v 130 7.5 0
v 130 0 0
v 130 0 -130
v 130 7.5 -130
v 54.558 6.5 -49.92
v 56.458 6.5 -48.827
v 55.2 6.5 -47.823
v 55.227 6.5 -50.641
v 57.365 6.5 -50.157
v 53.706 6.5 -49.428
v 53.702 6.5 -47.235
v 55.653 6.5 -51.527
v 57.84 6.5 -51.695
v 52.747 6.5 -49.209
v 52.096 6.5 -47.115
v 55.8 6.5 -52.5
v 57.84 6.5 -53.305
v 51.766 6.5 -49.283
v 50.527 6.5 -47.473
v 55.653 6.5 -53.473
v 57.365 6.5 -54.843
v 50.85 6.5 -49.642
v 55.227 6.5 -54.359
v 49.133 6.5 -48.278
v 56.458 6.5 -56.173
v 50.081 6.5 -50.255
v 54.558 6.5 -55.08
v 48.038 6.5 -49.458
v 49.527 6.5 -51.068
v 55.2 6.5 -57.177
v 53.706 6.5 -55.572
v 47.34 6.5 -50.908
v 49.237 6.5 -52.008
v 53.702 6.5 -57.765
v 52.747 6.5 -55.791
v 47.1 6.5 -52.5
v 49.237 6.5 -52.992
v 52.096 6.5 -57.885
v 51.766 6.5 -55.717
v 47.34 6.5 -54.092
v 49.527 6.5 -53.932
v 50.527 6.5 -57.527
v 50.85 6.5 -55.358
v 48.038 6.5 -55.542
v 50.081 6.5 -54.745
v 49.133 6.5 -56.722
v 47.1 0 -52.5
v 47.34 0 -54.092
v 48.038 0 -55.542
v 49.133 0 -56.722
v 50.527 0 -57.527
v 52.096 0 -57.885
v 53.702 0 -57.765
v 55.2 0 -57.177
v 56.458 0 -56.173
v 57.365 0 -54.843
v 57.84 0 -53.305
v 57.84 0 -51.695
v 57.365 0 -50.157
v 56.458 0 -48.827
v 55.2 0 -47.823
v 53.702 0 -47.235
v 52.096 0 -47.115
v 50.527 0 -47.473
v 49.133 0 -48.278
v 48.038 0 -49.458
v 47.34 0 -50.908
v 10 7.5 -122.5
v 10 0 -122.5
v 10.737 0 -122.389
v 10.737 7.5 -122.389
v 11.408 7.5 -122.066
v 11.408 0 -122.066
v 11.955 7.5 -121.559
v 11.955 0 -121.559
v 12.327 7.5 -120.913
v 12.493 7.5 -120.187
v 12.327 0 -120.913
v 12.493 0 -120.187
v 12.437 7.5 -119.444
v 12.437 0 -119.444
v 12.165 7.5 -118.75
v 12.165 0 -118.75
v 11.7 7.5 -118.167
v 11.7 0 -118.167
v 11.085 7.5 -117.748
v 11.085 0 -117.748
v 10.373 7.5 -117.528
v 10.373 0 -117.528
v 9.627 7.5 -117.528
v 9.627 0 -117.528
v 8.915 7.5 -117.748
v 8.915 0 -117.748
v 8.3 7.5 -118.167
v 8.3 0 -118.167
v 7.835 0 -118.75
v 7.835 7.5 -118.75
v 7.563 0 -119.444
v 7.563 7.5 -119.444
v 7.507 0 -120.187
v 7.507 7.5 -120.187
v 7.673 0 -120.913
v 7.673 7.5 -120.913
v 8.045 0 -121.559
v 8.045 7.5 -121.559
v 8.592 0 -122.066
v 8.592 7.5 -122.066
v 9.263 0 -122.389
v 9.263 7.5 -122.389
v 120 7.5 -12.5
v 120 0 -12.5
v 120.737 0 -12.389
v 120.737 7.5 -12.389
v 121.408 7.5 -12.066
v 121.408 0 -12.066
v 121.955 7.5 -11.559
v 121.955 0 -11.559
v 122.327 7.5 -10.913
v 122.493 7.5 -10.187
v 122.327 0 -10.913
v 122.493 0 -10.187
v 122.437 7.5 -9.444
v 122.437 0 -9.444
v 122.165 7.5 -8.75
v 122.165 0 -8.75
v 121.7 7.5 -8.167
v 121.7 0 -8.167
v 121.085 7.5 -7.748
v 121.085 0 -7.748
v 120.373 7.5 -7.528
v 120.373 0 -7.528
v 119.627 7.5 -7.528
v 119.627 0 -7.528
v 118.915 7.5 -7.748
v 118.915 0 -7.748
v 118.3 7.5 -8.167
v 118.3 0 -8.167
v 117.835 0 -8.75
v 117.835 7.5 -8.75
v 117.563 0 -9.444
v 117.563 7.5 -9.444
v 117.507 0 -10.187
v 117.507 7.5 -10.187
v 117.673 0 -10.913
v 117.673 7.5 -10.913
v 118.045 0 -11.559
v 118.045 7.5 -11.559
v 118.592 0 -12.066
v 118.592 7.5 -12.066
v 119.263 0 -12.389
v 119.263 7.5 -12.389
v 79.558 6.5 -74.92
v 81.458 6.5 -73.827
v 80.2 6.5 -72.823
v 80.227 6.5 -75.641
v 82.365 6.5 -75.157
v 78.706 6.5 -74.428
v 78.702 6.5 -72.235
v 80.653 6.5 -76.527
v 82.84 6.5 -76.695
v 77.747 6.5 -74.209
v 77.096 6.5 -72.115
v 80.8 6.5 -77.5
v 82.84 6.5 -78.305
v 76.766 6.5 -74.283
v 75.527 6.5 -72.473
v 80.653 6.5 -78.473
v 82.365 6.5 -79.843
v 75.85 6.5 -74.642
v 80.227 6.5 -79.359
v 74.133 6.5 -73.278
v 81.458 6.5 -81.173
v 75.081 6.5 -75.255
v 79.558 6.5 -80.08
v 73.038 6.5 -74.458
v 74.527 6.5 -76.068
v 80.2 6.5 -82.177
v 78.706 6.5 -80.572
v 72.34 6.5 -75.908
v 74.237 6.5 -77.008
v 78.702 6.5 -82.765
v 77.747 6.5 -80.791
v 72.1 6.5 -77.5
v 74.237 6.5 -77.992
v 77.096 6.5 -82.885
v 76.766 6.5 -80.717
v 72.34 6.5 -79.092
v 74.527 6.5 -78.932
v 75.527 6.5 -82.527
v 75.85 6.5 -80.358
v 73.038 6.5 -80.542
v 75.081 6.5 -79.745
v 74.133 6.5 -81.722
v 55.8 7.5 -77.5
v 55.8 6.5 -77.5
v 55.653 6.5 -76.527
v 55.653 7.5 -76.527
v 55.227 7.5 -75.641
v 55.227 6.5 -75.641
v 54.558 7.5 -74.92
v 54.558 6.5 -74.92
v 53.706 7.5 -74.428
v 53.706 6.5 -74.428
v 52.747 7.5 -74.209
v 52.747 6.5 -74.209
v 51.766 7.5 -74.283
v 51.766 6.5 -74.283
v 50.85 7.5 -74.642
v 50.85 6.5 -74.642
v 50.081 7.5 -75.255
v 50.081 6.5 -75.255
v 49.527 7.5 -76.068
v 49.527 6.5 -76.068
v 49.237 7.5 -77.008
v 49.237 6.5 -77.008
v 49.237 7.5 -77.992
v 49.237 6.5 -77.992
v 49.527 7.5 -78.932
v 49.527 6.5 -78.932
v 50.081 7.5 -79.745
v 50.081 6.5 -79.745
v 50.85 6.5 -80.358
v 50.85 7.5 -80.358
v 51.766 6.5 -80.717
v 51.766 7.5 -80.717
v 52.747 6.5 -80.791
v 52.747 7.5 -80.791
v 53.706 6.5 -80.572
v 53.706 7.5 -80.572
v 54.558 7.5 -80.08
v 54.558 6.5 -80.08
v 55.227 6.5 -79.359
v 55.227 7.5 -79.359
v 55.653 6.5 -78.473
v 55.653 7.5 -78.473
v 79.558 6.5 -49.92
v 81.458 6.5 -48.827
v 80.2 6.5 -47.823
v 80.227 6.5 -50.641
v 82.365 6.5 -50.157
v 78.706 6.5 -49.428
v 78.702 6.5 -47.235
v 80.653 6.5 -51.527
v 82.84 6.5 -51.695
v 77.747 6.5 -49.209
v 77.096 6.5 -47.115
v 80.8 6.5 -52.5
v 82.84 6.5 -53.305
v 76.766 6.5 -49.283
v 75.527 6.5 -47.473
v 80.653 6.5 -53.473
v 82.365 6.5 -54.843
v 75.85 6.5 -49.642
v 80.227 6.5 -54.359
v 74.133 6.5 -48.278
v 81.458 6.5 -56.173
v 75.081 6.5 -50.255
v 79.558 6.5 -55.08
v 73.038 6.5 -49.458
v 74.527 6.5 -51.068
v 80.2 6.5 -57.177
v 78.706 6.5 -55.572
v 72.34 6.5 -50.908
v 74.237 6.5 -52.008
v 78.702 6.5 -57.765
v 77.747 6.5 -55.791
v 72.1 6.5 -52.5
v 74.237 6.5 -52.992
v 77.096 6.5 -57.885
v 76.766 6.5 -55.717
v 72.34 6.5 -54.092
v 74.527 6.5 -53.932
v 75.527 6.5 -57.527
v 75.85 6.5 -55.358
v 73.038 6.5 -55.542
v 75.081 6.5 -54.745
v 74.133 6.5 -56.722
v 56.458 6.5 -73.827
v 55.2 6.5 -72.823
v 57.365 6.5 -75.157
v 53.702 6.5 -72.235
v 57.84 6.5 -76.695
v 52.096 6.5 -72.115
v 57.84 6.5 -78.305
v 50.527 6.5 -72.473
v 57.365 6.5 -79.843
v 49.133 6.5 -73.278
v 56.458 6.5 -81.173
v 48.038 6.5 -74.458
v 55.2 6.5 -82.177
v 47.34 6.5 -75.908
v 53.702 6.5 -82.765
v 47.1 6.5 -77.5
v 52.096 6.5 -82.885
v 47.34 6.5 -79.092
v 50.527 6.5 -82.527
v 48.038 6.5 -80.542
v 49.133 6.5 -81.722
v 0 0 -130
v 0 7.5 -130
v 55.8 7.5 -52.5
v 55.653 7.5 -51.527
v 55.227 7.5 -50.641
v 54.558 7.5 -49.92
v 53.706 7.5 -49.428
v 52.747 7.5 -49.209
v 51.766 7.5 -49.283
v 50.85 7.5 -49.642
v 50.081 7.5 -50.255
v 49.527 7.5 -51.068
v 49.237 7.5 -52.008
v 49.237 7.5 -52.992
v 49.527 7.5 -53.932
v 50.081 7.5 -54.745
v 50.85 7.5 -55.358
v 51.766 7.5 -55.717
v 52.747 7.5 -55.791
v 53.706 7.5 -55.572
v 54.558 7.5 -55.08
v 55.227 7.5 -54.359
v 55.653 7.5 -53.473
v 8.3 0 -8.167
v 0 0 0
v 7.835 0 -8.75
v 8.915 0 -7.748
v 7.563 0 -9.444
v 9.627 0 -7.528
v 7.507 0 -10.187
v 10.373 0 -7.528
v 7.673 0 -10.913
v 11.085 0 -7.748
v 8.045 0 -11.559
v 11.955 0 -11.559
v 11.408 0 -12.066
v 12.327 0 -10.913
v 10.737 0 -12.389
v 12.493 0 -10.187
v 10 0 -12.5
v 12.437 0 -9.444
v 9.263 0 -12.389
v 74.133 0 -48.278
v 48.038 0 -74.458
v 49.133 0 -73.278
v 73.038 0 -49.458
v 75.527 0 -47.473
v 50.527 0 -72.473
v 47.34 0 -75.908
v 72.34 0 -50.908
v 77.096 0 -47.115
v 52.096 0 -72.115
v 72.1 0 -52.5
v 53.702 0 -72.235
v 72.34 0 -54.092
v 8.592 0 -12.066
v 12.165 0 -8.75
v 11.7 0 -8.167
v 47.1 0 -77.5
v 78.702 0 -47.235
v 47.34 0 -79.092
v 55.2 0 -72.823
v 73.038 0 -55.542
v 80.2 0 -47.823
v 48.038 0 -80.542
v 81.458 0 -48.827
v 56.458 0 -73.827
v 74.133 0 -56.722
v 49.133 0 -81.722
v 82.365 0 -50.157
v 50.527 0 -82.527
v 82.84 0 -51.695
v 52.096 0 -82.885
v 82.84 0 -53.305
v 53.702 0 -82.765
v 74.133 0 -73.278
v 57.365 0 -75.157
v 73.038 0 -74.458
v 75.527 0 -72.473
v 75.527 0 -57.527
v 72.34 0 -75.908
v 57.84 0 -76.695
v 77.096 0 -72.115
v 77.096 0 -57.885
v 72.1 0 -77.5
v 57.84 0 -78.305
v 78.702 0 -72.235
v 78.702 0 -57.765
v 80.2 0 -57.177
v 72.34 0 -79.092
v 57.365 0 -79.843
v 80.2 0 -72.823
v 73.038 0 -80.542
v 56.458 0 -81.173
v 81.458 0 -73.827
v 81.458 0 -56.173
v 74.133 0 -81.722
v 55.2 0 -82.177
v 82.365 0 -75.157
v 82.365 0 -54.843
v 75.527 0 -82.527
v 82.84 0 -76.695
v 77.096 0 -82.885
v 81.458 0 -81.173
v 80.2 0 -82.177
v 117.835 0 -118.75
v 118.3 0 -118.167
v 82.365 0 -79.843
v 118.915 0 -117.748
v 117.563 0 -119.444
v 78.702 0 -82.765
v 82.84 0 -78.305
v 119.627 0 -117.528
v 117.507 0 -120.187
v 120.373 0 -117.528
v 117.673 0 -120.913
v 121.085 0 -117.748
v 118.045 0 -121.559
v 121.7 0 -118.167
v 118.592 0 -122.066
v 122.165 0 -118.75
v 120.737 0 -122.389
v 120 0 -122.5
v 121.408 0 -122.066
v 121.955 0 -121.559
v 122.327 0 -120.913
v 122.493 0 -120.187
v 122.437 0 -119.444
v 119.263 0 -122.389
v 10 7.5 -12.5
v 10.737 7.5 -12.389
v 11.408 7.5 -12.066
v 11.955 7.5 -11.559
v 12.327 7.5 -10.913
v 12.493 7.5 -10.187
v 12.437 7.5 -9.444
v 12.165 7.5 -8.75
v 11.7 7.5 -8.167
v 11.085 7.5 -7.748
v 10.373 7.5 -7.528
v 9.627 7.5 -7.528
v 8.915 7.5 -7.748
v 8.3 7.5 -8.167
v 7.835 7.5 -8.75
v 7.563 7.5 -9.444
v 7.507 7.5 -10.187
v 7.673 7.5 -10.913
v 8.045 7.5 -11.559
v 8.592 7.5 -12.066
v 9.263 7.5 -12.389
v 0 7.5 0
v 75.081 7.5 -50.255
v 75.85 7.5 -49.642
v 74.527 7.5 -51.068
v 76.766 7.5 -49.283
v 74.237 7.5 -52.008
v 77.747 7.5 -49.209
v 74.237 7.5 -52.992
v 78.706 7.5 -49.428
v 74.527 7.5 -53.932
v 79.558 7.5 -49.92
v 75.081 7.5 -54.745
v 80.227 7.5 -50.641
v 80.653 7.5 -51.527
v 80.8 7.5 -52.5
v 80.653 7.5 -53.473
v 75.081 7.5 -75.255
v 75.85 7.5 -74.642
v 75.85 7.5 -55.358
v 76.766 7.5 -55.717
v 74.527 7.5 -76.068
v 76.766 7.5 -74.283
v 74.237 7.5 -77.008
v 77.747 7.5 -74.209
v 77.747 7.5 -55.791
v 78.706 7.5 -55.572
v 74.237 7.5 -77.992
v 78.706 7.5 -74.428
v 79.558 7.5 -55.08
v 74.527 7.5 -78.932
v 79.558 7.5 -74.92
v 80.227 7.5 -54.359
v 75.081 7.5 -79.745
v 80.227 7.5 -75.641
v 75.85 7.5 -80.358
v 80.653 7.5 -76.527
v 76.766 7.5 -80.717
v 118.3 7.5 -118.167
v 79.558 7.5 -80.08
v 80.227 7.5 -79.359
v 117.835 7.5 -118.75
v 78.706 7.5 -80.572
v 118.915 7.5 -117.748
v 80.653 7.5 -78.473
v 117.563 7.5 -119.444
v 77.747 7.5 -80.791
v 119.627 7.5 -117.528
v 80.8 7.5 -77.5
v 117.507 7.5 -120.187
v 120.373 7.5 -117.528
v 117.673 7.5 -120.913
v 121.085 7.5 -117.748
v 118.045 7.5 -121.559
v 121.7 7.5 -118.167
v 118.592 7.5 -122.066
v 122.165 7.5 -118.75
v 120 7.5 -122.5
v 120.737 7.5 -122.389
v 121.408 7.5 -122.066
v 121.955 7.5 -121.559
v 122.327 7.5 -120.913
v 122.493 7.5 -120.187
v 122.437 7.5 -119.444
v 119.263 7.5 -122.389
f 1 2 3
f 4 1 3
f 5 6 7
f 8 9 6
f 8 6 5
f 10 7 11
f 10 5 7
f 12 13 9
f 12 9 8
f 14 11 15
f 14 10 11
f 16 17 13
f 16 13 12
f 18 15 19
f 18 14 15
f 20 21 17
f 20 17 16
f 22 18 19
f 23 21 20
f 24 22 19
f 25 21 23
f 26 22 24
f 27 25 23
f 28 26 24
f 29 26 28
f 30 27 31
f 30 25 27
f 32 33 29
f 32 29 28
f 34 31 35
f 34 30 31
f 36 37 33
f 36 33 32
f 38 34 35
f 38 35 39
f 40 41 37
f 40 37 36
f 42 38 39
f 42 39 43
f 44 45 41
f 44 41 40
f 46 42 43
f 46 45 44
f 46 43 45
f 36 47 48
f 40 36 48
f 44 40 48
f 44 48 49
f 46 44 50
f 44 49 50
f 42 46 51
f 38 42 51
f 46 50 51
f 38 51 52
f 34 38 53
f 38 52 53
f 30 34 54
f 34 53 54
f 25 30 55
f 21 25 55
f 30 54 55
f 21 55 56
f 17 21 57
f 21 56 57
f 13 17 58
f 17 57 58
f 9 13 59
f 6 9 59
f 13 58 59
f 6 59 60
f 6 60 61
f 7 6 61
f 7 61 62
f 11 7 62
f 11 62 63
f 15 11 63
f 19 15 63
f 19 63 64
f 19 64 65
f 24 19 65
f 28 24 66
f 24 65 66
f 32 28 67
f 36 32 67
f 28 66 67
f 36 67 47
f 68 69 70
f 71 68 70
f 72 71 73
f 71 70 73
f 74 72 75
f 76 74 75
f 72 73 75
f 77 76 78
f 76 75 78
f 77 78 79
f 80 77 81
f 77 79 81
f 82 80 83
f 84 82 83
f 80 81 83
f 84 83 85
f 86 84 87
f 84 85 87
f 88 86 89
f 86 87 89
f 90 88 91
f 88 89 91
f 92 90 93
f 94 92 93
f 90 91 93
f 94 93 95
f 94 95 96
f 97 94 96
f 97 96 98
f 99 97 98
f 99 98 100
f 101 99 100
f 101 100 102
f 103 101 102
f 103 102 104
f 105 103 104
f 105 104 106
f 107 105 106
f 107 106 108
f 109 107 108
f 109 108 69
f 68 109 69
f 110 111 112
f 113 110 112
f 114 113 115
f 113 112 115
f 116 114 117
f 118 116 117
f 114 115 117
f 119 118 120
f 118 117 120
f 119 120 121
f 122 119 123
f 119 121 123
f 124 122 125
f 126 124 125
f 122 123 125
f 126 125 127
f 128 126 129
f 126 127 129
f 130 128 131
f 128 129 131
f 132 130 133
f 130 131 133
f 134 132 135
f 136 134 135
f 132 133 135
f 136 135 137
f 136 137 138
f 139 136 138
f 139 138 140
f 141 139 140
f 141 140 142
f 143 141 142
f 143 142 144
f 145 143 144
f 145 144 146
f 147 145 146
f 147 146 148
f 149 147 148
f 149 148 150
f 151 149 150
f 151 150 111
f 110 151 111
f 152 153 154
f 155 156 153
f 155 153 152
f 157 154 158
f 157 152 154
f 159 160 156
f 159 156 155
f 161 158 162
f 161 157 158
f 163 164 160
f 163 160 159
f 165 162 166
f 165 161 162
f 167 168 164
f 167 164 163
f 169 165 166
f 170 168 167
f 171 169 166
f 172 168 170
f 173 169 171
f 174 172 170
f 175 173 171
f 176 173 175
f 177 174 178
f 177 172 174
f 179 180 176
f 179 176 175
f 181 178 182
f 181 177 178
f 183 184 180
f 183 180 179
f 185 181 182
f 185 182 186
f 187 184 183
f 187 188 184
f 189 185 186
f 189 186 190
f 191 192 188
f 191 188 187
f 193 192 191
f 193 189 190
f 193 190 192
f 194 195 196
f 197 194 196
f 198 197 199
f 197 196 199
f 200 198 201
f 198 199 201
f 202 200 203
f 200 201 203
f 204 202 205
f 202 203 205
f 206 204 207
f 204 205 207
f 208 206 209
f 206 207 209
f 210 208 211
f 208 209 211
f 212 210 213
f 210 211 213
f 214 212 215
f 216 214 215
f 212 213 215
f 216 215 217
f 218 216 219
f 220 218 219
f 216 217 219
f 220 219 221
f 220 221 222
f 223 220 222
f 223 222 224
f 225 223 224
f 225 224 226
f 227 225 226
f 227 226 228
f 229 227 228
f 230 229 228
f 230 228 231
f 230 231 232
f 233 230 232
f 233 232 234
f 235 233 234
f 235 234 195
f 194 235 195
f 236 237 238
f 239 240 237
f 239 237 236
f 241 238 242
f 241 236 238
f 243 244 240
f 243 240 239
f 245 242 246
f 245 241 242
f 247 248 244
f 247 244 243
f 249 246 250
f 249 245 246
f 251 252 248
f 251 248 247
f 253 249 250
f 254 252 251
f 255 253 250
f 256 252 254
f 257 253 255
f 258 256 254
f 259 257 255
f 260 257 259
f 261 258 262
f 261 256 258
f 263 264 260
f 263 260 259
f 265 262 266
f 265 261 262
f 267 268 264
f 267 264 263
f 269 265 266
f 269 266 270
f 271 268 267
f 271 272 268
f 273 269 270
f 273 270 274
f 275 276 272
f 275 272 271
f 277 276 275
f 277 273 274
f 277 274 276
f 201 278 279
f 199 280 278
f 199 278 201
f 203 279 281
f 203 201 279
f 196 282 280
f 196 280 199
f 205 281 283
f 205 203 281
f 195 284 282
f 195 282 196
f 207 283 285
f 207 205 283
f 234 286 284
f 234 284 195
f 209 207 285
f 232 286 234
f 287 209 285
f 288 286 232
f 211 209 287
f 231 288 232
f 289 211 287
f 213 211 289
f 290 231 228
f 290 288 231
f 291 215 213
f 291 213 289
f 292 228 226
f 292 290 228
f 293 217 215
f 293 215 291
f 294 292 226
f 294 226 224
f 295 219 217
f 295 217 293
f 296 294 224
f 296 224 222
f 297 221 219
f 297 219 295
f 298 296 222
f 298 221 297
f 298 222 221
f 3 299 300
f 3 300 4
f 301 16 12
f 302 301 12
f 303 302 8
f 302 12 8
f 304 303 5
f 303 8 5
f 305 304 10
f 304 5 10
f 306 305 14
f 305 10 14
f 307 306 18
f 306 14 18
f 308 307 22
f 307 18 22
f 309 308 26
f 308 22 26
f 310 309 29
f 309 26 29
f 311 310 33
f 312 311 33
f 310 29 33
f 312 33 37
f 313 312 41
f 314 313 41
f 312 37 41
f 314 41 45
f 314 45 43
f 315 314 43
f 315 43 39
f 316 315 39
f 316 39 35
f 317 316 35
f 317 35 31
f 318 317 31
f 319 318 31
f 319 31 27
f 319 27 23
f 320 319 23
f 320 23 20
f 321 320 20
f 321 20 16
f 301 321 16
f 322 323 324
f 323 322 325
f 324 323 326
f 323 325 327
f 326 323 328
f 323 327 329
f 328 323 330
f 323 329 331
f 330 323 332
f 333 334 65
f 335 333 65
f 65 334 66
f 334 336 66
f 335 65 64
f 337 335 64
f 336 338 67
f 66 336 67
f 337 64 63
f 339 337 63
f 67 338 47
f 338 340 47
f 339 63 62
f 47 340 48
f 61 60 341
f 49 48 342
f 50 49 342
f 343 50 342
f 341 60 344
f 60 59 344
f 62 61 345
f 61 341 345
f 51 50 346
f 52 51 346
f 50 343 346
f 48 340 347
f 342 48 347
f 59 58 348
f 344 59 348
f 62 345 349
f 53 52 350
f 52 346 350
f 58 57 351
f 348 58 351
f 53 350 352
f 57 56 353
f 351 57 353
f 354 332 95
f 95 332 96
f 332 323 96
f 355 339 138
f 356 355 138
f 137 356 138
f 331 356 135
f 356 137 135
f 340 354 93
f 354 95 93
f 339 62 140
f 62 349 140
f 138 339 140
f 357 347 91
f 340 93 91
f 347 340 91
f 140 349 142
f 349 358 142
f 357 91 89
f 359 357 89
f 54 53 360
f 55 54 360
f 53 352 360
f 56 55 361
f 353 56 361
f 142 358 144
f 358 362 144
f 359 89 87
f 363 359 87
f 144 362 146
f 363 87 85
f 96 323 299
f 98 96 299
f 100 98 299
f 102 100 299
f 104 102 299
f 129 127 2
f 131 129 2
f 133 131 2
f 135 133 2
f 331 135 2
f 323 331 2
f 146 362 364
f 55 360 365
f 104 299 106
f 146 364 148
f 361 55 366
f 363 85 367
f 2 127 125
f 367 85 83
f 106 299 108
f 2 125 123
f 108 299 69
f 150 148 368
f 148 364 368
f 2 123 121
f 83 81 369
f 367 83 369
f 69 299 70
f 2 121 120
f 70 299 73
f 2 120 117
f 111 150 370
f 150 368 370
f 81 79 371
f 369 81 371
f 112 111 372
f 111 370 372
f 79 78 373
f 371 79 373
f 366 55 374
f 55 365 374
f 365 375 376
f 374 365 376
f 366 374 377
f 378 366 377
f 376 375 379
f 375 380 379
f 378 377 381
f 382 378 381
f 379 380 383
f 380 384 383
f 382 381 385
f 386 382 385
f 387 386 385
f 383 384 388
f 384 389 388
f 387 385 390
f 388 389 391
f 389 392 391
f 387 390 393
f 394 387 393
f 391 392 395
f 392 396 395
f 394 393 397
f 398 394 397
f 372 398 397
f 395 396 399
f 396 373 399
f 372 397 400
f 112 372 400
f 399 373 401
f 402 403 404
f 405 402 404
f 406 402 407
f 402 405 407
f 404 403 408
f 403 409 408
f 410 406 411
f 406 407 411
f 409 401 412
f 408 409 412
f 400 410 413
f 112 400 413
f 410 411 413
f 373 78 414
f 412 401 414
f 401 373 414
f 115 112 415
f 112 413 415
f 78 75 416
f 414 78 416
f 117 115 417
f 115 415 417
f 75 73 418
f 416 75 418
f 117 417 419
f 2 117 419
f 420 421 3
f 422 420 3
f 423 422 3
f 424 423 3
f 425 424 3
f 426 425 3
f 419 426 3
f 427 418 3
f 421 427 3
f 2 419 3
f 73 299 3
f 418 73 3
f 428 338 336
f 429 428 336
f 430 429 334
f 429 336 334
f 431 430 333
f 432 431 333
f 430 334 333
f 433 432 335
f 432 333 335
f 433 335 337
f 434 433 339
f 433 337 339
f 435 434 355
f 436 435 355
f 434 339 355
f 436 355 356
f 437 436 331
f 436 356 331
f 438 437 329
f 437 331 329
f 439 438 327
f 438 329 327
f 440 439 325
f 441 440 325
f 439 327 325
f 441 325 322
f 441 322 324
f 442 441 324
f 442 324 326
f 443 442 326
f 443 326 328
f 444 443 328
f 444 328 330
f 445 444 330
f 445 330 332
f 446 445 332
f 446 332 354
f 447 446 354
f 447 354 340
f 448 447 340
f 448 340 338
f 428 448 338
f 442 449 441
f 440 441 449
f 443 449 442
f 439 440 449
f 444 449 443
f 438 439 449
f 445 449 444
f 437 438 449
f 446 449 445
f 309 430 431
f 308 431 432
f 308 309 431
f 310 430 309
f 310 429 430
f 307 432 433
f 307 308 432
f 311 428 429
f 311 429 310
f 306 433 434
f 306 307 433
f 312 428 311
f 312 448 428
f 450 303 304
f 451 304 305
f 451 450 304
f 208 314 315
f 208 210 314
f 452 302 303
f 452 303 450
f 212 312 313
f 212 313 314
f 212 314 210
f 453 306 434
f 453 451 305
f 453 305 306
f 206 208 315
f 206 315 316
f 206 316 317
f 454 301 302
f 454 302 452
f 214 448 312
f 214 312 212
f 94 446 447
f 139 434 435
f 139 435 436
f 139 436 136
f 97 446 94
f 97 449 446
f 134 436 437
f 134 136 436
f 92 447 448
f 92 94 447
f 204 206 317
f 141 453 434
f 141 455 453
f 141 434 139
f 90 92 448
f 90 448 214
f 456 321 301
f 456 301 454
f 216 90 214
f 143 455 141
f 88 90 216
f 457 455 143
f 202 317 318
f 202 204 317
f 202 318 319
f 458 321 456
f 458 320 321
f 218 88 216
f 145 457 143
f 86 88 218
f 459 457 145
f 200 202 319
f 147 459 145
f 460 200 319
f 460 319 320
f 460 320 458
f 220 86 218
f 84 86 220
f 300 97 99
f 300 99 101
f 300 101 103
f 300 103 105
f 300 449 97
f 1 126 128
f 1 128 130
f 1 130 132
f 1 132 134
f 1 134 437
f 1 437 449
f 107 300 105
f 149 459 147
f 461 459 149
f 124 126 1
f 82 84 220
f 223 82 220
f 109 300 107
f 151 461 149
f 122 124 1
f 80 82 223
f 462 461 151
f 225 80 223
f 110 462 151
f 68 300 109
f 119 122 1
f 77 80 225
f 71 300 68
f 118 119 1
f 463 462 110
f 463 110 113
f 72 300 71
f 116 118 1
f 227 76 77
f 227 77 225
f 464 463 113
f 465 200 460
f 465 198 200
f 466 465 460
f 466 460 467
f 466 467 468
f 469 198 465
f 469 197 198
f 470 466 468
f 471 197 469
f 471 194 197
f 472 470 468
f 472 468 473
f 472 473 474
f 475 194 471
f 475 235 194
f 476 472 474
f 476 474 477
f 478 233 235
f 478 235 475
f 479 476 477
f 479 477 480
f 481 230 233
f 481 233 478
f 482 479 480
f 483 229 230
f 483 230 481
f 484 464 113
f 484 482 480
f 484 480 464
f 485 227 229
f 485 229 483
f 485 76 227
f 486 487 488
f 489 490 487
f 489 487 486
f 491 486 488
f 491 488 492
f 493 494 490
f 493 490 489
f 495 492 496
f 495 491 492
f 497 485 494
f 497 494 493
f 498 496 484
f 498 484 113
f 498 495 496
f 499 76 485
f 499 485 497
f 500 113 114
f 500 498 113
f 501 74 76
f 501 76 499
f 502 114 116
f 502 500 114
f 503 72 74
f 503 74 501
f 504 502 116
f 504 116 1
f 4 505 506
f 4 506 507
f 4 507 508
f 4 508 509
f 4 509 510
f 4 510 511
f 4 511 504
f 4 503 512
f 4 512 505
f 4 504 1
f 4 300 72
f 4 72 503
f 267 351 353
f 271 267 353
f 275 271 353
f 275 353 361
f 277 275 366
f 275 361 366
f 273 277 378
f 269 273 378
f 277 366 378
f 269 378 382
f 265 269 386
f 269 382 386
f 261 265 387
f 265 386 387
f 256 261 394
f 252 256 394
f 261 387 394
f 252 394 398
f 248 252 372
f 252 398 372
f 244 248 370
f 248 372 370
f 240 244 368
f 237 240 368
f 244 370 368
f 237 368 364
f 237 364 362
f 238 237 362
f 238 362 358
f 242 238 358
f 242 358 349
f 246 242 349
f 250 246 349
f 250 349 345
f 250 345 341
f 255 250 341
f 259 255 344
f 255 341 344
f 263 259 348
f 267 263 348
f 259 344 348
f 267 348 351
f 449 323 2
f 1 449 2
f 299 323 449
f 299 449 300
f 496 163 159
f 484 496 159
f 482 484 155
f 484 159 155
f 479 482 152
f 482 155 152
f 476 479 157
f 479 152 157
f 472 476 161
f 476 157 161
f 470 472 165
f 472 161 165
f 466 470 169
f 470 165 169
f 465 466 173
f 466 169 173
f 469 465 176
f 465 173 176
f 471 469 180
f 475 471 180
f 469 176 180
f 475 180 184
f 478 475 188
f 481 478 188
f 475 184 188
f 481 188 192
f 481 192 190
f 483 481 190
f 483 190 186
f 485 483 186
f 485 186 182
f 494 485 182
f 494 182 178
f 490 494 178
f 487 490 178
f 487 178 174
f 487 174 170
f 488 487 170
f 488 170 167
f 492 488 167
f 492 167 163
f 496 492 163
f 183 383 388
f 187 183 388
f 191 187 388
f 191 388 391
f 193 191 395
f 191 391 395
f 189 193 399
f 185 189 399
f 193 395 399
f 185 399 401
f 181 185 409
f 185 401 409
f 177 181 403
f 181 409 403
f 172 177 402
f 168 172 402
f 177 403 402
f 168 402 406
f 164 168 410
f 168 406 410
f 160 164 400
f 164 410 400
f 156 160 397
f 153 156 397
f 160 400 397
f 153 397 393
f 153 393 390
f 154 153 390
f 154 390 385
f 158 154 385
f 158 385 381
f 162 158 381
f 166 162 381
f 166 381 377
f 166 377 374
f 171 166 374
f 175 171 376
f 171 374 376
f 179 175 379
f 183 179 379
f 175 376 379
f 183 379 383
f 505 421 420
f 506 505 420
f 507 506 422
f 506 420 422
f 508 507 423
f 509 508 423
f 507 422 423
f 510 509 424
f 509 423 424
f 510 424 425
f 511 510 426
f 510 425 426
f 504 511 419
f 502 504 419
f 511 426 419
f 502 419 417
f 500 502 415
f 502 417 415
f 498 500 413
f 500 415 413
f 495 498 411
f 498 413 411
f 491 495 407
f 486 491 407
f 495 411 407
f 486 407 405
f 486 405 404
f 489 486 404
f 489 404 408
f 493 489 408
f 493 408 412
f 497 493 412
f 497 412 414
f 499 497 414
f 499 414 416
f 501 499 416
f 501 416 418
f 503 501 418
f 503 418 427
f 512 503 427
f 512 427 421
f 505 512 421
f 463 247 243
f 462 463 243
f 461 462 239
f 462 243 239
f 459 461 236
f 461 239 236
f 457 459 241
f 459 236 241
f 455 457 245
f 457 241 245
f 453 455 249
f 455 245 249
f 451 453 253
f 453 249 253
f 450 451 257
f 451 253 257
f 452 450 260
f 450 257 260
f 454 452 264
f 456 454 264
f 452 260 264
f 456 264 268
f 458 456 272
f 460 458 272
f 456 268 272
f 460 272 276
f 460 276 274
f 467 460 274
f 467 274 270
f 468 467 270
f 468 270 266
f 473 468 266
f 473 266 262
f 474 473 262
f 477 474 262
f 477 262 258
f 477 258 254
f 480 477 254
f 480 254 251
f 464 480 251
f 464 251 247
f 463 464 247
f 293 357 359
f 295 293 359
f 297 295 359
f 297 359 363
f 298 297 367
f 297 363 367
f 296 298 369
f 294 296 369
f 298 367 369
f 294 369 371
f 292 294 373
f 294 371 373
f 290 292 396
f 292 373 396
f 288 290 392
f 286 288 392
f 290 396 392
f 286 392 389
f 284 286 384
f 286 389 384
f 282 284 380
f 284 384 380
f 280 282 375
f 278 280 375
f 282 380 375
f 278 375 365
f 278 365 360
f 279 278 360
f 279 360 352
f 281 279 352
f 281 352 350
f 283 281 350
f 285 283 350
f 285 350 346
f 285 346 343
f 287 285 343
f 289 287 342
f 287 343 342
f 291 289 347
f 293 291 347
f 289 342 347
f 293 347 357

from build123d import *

# Parameters (mm, degrees)
SKETCH_1_W          = 130
SKETCH_1_H          = 130
EXTRUDE_1_DEPTH     = 7.5
HOLE_WIZARD_M6_2_D  = 5
SKETCH_6_R          = 5.4
CUT_EXTRUDE_1_DEPTH = 6.5
SKETCH_7_R          = 3.3
CUT_EXTRUDE_2_DEPTH = 2


with BuildPart() as part:
    # 草图1 → 凸台-拉伸1 (new body)
    with BuildSketch(Plane(origin=(0, 0, 0), x_dir=(1, 0, 0), z_dir=(0, 1, 0))):
        with Locations((65, 65)):
            Rectangle(SKETCH_1_W, SKETCH_1_H)
    extrude(amount=EXTRUDE_1_DEPTH)

    # M6 螺纹孔2 (through all)
    with Locations(Plane(origin=(10, 7.5, -120), x_dir=(0, 0, 1), z_dir=(0, 1, 0))):
        with Locations((0, 0), (0, 110), (110, 110), (110, 0)):
            Hole(HOLE_WIZARD_M6_2_D / 2)

    # 草图6 → 切除-拉伸1 (cut)
    with BuildSketch(Plane(origin=(0, 0, 0), x_dir=(-1, 0, 0), z_dir=(0, -1, 0))):
        with Locations((-52.5, 52.5)):
            Circle(SKETCH_6_R)
        with Locations((-77.5, 52.5)):
            Circle(SKETCH_6_R)
        with Locations((-52.5, 77.5)):
            Circle(SKETCH_6_R)
        with Locations((-77.5, 77.5)):
            Circle(SKETCH_6_R)
    extrude(amount=-CUT_EXTRUDE_1_DEPTH, mode=Mode.SUBTRACT)

    # 草图7 → 切除-拉伸2 (cut, through all)
    with BuildSketch(Plane.XZ.offset(-6.5)):
        with Locations((52.5, -52.5)):
            Circle(SKETCH_7_R)
        with Locations((77.5, -52.5)):
            Circle(SKETCH_7_R)
        with Locations((77.5, -77.5)):
            Circle(SKETCH_7_R)
        with Locations((52.5, -77.5)):
            Circle(SKETCH_7_R)
    extrude(amount=-CUT_EXTRUDE_2_DEPTH, mode=Mode.SUBTRACT)


solid = part.part
